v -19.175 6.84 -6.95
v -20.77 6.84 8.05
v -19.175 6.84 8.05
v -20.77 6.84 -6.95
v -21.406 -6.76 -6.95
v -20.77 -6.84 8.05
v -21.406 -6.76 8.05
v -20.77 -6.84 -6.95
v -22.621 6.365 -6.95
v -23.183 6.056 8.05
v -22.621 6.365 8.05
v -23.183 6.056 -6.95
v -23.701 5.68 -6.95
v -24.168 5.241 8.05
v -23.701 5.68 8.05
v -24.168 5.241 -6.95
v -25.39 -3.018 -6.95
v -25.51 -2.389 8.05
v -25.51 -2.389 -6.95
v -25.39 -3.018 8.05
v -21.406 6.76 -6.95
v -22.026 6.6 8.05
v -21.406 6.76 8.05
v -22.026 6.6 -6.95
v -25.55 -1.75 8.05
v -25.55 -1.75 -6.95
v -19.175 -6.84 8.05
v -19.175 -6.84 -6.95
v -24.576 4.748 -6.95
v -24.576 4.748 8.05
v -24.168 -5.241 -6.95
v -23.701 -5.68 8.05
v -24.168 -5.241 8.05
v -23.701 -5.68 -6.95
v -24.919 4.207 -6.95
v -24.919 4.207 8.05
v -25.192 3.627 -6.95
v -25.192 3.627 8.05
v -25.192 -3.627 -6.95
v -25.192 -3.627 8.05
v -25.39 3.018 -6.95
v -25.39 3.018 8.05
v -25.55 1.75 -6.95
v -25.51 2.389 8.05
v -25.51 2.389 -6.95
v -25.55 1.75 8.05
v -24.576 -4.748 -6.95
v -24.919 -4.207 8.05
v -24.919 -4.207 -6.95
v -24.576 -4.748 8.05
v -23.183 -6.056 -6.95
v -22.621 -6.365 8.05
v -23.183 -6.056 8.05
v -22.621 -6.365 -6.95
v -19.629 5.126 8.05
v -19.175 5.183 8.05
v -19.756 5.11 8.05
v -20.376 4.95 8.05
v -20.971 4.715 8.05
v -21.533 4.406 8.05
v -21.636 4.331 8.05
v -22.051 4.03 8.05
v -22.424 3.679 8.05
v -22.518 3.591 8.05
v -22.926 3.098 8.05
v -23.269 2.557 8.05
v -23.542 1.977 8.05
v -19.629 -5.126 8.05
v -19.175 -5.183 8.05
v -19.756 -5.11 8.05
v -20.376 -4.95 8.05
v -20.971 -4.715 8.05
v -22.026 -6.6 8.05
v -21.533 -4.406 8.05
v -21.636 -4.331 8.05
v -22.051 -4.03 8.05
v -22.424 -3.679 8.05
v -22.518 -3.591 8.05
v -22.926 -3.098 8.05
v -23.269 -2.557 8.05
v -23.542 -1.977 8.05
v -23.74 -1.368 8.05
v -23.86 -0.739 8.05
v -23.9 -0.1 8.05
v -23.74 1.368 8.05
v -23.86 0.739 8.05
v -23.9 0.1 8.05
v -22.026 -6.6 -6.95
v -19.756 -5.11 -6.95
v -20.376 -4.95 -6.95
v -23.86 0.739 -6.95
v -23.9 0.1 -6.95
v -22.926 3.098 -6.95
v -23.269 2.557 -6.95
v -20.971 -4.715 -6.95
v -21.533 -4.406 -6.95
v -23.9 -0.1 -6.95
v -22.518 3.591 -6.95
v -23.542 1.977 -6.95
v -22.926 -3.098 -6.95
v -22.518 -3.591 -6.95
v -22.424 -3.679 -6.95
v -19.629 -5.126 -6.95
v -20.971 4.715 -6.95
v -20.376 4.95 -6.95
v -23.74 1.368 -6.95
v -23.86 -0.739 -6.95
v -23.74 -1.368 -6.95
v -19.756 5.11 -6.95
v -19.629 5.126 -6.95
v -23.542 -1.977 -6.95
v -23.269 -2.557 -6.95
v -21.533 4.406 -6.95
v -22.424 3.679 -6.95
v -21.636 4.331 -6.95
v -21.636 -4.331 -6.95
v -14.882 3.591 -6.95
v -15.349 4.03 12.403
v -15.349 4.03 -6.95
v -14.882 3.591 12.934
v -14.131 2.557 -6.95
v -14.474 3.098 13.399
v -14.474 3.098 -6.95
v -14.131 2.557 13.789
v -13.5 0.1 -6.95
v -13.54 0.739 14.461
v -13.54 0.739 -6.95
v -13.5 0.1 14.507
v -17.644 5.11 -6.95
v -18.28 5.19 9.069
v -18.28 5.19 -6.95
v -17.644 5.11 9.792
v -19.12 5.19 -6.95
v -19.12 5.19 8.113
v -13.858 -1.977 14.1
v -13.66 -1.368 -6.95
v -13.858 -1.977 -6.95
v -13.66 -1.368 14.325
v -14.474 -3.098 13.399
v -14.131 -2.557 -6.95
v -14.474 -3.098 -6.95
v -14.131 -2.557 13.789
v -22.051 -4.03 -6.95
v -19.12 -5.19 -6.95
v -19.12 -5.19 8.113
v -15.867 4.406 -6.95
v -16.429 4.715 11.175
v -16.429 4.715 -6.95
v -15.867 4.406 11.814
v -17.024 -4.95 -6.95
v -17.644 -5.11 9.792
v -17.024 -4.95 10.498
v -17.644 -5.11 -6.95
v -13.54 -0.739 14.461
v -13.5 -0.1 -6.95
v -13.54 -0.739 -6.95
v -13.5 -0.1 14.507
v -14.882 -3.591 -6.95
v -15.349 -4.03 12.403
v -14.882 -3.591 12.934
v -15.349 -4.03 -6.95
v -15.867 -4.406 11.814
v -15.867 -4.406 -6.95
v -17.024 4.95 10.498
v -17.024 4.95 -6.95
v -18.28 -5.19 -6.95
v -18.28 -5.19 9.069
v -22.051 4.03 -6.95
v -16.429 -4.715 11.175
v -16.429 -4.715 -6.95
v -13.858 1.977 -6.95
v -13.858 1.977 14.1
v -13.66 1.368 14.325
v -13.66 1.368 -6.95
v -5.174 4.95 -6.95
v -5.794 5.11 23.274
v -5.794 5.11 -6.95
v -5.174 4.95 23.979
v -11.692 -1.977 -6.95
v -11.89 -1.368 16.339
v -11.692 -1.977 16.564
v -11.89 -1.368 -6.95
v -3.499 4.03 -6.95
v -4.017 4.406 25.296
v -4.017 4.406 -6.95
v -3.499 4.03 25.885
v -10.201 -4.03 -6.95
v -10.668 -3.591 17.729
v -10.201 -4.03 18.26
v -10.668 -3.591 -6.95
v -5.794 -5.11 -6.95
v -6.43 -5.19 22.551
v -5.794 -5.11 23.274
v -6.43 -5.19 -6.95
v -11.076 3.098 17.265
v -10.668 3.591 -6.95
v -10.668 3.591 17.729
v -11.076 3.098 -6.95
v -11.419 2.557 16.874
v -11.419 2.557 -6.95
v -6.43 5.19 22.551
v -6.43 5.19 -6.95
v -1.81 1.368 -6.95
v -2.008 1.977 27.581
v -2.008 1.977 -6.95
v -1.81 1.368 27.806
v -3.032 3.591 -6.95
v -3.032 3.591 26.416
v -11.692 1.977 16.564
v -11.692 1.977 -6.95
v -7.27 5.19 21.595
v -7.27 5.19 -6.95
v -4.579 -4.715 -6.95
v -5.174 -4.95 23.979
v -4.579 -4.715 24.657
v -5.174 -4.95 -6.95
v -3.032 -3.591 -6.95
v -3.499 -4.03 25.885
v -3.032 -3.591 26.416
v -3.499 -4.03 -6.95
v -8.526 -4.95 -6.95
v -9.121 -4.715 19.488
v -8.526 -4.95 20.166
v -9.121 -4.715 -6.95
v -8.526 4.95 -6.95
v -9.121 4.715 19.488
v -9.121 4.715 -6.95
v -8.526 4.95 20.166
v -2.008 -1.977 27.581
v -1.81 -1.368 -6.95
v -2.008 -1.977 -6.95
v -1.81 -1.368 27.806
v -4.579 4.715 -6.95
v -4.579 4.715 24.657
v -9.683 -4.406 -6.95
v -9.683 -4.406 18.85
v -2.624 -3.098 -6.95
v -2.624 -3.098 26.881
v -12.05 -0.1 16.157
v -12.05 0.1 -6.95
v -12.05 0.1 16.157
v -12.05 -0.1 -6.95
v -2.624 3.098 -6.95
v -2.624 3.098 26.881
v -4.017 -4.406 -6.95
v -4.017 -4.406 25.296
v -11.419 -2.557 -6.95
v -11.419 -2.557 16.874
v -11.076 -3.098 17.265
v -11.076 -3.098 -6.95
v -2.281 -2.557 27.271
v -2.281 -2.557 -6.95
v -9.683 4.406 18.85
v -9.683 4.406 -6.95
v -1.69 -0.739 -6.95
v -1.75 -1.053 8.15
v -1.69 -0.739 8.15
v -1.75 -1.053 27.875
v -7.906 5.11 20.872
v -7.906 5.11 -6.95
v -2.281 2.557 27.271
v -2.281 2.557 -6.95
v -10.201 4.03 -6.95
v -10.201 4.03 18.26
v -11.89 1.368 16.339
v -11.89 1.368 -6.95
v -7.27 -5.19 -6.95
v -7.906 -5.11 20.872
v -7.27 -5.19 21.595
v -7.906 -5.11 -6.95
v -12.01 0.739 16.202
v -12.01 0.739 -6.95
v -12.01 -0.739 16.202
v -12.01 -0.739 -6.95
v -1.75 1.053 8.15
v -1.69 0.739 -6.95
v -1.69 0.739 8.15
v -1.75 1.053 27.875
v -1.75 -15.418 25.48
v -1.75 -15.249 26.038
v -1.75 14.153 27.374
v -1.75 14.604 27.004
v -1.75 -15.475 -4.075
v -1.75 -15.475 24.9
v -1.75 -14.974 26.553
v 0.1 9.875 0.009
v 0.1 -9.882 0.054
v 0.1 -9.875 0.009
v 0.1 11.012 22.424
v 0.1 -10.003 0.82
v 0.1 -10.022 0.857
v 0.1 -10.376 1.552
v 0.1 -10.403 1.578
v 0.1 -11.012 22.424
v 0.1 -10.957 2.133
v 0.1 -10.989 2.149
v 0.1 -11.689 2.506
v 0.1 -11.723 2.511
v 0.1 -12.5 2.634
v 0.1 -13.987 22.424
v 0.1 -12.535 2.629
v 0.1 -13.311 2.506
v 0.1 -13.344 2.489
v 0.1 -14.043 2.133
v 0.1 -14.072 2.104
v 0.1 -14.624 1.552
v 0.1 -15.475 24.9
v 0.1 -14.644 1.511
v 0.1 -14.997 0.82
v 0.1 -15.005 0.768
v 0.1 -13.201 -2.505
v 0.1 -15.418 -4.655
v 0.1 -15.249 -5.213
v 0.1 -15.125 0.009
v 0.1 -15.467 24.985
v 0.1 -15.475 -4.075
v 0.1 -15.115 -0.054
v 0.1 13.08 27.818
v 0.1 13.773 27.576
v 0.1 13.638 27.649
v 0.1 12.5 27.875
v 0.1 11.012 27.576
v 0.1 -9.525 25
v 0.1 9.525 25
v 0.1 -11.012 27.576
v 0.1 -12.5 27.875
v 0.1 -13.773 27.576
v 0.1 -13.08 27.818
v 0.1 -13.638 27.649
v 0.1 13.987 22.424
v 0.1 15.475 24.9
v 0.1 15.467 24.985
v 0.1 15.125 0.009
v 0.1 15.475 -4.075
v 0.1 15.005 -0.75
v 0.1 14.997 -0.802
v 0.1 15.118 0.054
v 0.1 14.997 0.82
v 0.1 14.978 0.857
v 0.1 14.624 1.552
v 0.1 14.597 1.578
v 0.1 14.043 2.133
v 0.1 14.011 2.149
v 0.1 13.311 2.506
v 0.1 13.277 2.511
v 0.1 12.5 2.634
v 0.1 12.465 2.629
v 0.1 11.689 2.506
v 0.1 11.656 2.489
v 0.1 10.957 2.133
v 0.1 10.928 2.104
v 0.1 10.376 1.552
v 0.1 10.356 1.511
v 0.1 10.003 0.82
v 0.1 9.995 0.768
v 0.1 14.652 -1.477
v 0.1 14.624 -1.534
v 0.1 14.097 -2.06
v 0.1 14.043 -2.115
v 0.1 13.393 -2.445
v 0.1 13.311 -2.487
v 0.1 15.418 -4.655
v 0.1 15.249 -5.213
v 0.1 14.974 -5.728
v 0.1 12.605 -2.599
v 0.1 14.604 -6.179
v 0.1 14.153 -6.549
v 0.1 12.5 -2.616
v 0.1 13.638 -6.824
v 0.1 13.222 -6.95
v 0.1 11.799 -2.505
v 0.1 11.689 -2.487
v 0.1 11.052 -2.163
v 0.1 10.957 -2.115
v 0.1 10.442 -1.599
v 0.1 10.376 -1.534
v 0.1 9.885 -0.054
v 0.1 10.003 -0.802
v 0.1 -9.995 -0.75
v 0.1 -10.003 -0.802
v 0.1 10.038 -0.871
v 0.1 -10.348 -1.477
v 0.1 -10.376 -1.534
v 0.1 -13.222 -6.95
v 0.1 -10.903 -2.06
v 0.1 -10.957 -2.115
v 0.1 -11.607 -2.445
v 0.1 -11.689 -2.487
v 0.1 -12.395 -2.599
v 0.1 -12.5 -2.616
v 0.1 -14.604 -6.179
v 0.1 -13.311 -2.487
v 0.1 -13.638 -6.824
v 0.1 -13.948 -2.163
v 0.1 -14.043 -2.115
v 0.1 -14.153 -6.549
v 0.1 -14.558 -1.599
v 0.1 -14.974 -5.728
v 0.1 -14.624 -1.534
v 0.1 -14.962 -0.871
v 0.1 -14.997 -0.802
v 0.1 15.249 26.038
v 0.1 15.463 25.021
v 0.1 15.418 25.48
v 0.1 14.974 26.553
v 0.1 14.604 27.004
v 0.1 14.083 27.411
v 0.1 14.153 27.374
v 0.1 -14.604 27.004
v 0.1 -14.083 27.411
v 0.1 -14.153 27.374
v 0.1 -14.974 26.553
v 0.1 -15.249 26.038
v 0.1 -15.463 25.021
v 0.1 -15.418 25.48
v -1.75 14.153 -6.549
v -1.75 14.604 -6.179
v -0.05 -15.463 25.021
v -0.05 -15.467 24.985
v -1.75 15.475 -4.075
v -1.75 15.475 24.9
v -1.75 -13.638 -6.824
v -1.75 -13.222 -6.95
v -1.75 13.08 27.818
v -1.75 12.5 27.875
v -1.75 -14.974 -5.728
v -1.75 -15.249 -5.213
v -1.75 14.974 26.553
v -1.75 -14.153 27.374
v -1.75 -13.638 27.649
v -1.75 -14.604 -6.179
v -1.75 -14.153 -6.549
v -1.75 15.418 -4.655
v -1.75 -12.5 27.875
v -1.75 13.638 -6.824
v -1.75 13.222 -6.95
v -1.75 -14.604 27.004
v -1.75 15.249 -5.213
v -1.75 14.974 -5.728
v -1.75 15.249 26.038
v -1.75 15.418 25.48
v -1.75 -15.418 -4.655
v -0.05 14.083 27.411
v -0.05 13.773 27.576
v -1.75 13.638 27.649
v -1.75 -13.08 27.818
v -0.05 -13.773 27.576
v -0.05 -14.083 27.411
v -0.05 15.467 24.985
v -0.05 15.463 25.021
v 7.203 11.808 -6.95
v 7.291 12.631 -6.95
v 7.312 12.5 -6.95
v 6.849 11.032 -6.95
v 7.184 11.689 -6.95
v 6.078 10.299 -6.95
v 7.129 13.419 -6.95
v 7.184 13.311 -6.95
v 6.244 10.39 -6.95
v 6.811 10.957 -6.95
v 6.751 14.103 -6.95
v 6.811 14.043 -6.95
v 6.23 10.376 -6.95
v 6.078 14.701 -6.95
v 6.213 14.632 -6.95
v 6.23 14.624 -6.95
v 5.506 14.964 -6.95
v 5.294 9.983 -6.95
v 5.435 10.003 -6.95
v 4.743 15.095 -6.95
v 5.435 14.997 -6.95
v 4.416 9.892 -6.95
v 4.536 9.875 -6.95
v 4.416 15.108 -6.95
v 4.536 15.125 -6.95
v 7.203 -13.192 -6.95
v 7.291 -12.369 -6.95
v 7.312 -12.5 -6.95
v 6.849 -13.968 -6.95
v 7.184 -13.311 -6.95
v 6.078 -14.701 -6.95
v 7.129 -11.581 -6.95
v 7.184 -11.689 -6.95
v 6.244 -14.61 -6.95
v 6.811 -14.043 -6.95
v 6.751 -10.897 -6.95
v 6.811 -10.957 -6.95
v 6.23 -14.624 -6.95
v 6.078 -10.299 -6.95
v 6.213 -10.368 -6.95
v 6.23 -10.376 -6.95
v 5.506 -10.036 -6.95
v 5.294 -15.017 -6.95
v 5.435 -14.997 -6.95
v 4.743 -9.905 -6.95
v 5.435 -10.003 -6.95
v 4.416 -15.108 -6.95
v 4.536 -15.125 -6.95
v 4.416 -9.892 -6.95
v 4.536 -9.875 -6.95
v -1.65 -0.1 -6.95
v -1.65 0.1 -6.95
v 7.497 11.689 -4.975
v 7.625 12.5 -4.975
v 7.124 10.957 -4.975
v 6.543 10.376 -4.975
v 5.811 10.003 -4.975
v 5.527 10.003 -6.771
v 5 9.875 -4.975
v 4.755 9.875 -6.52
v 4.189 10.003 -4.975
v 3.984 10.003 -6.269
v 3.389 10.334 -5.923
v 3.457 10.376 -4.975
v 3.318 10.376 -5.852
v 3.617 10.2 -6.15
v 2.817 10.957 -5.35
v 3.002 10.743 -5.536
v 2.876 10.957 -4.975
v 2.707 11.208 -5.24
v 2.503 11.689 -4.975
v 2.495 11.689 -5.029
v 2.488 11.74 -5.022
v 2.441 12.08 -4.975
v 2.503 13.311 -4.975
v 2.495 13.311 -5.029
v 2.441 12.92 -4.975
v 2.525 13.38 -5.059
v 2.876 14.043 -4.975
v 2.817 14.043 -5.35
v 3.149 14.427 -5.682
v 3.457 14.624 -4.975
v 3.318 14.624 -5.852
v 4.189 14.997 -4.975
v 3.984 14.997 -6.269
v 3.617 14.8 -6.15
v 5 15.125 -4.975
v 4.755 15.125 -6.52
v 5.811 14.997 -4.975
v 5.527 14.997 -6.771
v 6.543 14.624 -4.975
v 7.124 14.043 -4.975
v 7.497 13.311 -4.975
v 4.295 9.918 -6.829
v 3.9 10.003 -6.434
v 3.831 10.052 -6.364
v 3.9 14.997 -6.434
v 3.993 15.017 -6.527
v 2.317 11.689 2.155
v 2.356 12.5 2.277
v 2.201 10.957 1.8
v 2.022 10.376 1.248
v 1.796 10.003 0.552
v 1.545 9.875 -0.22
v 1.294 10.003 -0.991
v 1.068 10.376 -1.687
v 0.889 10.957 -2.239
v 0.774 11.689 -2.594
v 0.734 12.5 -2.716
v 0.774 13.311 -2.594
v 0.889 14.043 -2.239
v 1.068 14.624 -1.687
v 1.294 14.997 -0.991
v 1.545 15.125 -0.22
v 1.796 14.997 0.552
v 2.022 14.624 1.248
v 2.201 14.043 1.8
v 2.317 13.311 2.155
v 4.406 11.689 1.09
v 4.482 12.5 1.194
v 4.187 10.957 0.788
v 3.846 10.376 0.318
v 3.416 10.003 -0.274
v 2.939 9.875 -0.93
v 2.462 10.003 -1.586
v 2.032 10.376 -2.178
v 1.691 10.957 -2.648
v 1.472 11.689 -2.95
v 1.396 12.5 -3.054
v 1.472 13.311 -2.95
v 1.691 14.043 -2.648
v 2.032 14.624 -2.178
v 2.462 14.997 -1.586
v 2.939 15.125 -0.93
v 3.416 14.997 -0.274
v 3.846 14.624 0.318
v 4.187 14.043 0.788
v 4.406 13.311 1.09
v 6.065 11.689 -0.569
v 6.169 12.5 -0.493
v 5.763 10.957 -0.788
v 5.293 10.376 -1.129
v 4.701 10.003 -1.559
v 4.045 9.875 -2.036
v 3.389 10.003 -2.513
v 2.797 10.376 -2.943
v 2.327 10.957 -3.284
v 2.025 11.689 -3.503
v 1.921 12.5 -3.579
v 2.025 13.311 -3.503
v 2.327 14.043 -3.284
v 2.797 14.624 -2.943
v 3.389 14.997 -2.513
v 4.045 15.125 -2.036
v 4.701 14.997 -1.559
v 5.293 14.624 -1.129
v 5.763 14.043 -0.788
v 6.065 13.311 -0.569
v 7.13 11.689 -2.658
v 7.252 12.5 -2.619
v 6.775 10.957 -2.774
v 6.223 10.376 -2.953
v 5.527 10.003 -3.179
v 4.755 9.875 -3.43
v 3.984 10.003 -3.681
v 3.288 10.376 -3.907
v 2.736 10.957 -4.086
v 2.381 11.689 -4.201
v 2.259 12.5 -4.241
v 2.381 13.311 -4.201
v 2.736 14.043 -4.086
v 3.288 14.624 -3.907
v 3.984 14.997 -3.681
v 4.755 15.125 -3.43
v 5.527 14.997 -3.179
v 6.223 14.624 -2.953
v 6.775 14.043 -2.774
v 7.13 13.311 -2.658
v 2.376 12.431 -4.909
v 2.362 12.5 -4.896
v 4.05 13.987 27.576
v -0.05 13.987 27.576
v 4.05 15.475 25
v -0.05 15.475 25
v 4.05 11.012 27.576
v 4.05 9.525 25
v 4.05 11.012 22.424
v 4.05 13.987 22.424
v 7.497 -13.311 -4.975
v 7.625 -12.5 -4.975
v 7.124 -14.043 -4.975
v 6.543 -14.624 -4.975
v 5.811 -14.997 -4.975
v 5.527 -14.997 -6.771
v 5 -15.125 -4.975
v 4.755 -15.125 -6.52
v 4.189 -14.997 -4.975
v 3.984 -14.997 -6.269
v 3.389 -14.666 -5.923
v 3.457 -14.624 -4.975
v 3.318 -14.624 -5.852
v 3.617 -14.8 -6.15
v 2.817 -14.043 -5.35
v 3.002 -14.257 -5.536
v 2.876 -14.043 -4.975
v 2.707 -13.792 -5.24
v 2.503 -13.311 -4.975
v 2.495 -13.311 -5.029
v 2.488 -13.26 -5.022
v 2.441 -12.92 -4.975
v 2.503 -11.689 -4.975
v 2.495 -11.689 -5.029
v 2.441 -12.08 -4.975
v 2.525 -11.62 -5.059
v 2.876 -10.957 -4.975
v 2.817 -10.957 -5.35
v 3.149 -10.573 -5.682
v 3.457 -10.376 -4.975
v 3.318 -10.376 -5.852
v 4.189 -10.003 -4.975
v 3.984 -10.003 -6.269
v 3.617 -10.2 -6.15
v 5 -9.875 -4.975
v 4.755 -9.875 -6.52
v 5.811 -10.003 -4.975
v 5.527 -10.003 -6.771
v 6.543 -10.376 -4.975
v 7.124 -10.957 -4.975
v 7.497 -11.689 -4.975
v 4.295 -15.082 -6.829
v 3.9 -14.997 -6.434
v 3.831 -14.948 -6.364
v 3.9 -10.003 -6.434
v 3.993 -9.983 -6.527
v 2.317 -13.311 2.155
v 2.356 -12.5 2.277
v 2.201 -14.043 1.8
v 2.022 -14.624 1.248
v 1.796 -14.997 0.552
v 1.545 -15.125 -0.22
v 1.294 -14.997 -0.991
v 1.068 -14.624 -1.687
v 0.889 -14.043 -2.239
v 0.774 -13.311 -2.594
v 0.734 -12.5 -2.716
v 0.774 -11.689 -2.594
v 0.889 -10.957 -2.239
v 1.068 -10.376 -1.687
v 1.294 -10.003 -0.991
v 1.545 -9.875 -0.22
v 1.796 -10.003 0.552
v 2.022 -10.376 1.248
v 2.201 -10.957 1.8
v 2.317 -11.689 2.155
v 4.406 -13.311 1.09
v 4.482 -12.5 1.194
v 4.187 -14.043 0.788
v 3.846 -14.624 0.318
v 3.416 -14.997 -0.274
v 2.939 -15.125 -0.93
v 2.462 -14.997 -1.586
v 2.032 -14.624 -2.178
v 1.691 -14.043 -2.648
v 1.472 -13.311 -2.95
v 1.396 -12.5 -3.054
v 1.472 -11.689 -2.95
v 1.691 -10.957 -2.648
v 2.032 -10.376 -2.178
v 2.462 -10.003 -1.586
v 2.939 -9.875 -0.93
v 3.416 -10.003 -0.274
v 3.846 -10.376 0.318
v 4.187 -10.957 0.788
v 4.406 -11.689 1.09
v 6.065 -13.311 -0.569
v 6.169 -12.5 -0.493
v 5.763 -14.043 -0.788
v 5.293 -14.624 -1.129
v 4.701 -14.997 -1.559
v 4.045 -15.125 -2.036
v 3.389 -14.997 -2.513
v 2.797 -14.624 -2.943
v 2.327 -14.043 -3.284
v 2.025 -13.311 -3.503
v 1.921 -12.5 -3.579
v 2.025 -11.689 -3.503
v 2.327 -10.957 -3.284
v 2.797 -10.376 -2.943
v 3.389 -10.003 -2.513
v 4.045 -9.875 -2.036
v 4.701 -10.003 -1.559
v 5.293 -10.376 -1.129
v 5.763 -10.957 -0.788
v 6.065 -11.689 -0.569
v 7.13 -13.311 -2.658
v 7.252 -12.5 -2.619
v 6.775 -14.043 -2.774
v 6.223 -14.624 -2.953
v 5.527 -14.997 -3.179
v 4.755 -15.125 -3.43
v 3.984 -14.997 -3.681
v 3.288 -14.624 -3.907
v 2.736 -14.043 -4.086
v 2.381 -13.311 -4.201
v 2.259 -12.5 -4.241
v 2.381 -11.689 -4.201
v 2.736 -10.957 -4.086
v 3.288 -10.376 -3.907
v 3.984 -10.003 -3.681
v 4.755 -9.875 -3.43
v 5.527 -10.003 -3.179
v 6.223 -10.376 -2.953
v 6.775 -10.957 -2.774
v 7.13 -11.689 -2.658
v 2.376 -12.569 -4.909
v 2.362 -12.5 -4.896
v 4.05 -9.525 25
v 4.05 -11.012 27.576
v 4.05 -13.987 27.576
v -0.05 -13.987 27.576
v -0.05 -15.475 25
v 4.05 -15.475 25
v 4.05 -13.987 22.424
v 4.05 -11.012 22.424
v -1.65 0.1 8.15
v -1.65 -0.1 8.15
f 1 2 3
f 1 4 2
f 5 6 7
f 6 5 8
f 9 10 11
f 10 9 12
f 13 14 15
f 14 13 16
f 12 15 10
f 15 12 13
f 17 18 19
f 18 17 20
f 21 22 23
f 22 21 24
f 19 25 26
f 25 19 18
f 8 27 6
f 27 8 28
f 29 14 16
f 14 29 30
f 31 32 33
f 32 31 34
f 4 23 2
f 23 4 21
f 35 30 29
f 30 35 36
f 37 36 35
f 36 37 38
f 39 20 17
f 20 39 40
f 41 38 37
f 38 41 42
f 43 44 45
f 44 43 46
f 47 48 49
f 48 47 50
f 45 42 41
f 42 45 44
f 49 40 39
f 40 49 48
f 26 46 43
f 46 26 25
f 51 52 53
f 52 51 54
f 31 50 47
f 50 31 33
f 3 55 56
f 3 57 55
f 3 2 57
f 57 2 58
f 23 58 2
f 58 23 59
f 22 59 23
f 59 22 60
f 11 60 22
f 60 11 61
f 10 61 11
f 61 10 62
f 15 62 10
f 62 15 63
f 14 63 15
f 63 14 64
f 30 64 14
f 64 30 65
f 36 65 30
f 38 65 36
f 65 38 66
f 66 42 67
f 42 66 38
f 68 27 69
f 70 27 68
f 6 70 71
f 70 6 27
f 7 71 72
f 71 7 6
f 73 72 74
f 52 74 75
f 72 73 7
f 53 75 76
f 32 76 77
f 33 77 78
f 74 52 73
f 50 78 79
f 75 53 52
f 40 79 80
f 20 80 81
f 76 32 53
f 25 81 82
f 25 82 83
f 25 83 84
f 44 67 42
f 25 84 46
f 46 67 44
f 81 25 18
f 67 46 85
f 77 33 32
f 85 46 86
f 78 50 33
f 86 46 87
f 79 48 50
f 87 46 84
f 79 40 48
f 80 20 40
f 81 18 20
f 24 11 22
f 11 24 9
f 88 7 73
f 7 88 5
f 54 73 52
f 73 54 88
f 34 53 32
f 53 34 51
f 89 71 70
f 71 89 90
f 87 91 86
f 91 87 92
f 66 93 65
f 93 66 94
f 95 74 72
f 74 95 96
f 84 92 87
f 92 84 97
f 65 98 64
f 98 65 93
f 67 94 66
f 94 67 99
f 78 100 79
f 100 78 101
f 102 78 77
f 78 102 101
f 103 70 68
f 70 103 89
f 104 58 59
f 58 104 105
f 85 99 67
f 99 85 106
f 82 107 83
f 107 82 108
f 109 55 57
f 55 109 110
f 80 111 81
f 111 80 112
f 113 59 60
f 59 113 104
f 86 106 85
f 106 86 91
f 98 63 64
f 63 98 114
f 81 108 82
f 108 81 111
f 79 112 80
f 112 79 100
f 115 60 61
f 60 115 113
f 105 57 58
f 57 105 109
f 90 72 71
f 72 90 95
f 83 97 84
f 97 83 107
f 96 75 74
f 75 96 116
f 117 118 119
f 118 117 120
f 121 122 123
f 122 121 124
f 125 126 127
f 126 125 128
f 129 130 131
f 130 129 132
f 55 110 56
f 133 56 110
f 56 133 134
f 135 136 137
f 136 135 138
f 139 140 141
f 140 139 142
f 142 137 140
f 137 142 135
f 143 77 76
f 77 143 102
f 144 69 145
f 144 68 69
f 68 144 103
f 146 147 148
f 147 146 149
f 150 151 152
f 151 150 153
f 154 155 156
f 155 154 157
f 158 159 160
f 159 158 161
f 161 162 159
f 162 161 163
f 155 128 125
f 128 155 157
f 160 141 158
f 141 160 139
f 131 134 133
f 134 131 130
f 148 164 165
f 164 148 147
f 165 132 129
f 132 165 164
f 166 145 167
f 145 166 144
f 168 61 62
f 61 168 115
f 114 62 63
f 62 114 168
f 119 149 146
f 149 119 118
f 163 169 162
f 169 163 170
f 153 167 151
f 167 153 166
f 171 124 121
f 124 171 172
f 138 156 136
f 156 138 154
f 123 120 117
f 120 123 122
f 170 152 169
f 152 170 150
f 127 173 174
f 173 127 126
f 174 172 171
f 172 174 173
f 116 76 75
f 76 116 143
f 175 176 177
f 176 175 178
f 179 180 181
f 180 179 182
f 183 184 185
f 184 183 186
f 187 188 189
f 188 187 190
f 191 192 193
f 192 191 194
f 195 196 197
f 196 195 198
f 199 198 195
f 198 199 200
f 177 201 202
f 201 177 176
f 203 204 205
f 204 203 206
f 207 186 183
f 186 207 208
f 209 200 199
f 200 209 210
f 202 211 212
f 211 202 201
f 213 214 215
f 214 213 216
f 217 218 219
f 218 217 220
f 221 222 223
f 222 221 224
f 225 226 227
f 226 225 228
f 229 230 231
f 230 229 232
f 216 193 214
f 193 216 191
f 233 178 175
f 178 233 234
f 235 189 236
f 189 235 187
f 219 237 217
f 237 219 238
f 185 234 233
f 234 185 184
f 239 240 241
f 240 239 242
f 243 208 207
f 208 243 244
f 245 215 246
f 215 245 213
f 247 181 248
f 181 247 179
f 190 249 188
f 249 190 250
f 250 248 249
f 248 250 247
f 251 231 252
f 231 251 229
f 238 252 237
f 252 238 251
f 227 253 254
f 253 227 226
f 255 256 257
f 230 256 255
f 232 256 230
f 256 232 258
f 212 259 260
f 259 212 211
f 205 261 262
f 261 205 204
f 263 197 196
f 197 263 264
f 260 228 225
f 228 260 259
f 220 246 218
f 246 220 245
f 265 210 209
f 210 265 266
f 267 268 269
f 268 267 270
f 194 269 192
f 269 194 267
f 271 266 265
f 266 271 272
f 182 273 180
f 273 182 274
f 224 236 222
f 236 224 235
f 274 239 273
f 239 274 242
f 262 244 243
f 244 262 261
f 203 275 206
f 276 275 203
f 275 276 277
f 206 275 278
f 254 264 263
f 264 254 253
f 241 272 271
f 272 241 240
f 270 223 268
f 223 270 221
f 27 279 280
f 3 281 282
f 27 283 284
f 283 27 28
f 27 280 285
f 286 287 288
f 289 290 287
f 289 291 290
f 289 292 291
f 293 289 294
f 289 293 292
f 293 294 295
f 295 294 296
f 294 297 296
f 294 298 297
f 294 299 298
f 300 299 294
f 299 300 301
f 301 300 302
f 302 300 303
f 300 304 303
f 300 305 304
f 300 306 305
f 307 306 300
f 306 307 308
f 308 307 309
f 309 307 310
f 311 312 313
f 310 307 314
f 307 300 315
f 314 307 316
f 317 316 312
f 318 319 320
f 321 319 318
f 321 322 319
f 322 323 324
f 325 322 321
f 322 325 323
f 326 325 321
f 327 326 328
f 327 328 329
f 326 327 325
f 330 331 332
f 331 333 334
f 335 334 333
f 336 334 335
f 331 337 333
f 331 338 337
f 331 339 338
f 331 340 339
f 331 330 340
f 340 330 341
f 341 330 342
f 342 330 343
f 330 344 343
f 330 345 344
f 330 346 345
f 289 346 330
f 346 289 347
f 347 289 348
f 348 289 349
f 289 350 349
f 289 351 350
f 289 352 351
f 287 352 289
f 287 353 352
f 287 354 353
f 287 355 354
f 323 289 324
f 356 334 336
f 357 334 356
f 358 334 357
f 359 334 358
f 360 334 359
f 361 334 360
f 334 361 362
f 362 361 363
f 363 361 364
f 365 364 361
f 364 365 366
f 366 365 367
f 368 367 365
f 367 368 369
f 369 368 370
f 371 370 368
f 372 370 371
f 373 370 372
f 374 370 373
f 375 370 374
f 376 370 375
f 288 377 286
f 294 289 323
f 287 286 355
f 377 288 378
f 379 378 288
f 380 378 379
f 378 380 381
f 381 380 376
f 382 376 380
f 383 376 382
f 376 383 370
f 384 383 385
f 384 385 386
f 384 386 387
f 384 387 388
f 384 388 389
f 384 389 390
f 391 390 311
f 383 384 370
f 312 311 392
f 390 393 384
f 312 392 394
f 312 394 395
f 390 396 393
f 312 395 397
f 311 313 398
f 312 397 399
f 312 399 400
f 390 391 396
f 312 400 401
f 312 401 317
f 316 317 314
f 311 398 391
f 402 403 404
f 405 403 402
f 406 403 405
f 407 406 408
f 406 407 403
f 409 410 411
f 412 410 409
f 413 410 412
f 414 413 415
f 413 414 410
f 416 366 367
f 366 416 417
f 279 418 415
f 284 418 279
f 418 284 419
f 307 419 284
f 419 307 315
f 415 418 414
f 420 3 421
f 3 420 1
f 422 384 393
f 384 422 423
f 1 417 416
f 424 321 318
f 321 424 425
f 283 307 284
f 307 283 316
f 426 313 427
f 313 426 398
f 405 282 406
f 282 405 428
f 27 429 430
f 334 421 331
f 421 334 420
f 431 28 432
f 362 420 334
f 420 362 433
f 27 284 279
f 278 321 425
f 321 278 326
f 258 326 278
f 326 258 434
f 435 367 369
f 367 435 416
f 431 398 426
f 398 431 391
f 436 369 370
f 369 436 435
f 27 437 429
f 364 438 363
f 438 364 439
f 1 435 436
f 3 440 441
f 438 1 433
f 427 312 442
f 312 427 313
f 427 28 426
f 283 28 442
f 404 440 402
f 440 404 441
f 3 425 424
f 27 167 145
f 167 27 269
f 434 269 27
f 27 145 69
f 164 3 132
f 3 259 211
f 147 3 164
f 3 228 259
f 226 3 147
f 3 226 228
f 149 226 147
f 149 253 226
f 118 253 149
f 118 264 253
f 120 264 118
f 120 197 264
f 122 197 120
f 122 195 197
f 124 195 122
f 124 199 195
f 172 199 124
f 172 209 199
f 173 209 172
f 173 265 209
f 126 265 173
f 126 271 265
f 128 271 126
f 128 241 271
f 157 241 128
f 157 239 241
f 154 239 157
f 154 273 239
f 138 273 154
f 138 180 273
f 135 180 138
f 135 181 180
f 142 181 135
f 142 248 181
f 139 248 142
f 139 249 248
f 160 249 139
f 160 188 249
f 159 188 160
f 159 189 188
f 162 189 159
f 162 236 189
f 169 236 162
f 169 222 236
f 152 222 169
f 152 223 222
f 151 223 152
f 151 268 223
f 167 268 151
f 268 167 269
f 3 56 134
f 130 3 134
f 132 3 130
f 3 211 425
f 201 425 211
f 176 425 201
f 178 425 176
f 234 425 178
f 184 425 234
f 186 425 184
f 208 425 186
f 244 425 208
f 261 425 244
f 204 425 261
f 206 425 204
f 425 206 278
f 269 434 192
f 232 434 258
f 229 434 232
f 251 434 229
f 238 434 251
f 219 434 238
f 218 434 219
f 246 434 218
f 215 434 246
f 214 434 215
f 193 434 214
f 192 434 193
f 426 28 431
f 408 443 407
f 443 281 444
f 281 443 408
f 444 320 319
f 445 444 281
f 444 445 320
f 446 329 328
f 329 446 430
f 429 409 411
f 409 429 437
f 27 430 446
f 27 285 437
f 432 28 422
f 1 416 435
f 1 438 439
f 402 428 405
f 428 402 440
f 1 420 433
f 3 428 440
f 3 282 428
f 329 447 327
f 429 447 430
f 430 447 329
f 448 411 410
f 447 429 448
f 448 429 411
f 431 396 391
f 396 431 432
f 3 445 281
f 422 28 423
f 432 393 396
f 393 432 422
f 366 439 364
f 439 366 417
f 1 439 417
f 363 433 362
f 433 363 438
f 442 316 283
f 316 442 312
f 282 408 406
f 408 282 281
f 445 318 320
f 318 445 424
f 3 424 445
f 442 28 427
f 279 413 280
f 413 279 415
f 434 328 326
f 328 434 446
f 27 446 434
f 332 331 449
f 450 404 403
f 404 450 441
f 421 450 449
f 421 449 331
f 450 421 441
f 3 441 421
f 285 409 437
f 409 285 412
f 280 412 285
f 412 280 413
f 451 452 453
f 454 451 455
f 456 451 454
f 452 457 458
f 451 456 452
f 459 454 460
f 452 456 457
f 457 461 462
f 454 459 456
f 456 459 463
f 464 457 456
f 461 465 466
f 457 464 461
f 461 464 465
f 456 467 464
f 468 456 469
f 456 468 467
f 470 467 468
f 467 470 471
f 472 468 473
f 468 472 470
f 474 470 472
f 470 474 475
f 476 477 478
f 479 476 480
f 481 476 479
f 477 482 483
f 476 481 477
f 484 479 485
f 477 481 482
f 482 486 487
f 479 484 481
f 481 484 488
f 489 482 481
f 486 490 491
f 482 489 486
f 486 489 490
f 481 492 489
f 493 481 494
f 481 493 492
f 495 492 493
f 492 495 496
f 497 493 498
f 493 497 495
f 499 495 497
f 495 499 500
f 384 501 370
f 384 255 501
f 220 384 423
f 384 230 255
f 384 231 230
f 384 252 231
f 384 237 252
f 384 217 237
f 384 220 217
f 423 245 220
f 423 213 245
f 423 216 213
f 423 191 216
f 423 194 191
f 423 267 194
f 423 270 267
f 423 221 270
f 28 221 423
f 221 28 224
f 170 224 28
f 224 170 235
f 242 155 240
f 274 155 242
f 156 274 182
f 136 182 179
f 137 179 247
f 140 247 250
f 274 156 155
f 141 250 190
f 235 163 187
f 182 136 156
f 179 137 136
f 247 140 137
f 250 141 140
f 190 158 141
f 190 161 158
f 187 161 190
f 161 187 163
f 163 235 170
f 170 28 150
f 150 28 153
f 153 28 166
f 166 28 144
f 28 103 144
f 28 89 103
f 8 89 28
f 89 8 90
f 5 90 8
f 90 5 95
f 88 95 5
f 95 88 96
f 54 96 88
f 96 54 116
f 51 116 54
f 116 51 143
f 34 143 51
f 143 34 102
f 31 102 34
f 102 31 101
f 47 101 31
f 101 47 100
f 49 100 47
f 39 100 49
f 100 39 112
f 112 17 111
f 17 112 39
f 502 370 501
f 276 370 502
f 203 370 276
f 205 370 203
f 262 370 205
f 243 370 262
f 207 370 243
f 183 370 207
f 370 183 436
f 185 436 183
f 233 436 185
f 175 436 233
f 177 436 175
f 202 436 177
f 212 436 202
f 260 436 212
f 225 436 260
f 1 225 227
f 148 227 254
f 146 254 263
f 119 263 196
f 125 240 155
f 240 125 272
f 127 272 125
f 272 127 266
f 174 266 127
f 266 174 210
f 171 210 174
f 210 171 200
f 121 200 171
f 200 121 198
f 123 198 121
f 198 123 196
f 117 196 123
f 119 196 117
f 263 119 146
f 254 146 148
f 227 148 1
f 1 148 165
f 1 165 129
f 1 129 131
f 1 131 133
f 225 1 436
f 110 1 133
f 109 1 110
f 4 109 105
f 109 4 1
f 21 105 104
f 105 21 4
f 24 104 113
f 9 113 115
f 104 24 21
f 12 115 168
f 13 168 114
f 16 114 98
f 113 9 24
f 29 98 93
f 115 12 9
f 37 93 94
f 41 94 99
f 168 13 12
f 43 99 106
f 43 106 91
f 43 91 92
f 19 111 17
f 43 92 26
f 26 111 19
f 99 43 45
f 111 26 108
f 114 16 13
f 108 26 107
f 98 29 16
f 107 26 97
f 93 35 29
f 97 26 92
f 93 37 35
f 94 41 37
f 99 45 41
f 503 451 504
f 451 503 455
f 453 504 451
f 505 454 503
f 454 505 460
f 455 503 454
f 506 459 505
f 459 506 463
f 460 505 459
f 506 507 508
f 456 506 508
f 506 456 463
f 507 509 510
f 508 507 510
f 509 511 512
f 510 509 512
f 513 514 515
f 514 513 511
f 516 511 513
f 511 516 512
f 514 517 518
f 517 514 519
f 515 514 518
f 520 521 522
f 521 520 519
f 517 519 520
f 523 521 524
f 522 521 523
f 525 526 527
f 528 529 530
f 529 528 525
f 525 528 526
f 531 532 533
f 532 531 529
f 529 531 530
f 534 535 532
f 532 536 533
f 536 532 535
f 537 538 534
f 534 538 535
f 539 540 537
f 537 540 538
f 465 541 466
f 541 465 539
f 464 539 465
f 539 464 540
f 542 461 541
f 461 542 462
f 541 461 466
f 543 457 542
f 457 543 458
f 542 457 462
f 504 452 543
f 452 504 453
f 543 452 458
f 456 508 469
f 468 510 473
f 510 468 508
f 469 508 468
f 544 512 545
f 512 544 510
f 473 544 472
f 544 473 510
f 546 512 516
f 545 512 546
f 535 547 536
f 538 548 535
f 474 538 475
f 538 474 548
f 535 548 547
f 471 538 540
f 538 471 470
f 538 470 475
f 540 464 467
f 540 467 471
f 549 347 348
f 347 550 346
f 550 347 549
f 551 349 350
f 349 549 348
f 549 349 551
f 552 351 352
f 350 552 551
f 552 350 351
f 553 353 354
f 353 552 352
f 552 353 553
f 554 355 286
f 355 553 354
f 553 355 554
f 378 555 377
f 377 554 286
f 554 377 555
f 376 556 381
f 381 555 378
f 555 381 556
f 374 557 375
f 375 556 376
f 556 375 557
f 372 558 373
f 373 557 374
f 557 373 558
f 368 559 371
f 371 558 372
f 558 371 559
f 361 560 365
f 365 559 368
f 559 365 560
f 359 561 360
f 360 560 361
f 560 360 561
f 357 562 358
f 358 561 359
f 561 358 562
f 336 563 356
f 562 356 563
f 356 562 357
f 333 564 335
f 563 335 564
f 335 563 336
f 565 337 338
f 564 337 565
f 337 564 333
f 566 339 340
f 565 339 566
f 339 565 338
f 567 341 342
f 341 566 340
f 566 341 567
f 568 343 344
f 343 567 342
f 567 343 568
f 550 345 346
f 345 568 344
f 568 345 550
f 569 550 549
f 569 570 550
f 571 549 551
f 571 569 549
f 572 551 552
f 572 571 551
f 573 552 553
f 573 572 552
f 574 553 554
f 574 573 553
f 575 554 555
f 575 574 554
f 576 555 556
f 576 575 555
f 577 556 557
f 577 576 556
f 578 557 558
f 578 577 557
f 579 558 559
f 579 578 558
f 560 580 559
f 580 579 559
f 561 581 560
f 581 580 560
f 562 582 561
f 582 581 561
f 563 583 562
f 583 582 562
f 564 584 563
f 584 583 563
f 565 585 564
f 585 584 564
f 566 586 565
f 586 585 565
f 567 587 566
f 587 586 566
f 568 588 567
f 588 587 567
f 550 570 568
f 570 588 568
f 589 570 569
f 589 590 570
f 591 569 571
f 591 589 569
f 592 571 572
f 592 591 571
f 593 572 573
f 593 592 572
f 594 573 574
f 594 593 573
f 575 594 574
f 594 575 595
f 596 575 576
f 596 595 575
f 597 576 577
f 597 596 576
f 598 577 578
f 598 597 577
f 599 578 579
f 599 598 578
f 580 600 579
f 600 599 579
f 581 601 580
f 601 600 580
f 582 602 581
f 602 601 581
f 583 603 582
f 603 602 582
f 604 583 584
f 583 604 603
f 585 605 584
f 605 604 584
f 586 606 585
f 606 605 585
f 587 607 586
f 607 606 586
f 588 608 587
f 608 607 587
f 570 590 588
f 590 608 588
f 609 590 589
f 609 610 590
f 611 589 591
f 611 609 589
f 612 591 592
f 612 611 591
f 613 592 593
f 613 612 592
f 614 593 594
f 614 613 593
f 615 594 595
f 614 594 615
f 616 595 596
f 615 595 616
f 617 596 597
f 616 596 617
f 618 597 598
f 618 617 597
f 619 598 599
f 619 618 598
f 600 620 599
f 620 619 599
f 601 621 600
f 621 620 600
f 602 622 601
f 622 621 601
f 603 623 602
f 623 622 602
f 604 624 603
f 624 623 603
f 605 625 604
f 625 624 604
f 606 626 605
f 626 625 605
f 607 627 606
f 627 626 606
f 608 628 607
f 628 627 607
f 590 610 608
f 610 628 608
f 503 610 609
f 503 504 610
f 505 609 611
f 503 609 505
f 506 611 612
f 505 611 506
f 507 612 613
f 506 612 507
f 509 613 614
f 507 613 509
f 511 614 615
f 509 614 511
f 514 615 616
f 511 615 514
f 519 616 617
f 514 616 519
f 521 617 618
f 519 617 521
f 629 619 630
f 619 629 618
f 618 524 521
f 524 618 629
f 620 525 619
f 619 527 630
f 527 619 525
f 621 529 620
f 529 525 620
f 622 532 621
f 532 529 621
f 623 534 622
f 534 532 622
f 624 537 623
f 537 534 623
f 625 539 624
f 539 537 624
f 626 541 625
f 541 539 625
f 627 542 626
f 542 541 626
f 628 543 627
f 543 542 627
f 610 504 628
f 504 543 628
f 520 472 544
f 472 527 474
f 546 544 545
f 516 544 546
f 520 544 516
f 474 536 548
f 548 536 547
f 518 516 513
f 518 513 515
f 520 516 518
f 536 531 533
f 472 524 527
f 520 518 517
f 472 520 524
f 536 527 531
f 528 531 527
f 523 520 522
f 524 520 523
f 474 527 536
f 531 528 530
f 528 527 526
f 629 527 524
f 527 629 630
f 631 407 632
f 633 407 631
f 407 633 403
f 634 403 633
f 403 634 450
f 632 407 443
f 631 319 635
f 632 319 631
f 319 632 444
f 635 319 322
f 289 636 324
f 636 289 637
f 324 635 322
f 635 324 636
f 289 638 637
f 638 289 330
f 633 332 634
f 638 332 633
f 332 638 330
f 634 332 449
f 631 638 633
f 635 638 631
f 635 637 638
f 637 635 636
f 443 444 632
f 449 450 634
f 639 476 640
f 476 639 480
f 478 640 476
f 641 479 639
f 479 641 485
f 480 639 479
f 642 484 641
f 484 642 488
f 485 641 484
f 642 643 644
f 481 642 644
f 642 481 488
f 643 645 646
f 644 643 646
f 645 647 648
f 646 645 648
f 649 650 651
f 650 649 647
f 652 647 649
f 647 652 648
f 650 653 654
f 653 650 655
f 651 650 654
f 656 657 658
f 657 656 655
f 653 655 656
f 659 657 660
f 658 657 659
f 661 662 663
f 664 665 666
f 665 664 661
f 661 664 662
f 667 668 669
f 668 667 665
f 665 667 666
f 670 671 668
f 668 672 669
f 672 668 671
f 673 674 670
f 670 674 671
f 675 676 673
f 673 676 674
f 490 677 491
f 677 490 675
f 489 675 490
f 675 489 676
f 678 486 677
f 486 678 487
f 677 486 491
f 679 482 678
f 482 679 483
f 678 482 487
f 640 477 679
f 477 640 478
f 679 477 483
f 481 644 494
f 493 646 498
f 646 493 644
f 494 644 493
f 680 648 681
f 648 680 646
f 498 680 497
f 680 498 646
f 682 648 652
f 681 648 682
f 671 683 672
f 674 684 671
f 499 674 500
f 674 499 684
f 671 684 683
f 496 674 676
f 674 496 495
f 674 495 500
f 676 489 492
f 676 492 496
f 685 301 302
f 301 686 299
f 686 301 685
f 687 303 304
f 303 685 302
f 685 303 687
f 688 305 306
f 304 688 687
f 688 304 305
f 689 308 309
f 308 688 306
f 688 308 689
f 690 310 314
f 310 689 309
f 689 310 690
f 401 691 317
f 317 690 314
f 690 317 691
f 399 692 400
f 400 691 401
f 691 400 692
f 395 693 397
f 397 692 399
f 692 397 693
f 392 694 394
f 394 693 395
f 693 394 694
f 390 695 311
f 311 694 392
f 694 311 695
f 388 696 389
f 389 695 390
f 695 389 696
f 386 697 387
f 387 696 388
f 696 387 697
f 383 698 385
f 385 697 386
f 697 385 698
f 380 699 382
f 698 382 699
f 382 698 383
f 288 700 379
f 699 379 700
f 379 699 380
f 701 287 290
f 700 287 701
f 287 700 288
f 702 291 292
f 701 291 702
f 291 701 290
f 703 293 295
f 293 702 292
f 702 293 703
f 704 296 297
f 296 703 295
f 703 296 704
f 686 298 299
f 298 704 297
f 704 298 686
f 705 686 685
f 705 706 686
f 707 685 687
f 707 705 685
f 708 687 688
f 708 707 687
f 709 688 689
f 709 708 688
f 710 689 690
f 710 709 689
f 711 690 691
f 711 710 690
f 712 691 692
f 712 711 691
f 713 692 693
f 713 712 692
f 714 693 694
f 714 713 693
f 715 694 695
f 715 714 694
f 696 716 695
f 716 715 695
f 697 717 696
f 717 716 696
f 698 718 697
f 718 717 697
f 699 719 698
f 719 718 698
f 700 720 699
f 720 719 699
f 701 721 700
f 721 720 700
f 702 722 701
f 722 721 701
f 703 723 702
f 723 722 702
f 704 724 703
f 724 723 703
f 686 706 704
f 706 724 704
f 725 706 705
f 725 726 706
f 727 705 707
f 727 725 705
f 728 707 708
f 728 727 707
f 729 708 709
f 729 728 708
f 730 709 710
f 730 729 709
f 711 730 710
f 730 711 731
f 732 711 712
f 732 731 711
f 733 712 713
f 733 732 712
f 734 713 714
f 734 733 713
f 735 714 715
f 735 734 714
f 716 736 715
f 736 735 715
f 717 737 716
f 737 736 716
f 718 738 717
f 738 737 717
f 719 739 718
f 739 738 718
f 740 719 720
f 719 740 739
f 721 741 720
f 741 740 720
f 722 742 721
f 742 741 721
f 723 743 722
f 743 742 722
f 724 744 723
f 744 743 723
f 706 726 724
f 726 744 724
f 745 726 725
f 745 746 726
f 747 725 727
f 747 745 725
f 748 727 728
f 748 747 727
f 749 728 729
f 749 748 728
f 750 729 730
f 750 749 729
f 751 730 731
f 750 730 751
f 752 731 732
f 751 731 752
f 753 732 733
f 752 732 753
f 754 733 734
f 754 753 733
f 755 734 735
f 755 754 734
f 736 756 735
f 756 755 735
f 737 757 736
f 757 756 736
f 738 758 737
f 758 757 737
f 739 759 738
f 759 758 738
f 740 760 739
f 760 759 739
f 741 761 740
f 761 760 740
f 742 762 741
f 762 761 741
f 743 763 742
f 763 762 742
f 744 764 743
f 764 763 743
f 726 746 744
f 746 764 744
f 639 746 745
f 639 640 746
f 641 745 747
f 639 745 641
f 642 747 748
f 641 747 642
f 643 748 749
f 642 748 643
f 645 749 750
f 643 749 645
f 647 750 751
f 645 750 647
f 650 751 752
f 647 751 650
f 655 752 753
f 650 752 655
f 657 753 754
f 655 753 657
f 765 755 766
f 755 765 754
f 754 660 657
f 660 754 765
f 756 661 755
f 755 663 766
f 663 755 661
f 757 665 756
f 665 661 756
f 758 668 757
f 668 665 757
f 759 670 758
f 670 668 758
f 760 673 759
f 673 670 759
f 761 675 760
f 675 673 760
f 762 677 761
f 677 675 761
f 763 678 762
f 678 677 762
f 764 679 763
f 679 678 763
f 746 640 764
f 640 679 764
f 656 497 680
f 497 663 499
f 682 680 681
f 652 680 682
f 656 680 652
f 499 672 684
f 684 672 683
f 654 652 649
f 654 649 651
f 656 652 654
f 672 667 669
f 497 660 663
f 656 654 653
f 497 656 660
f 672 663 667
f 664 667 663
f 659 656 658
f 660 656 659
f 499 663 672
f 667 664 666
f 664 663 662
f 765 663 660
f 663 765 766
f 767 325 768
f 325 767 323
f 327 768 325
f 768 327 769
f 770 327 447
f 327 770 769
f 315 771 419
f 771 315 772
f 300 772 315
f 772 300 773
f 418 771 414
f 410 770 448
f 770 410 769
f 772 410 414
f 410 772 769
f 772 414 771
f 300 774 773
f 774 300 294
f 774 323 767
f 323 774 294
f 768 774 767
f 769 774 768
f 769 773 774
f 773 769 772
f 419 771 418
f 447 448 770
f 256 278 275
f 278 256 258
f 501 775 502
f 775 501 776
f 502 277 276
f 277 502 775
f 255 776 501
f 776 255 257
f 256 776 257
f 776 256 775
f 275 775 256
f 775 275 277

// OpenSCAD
// PEGSTR - Pegboard Wizard
// Design by Marius Gheorghescu, November 2014
// Update log:
// November 9th 2014
//		- first coomplete version. Angled holders are often odd/incorrect.
// November 15th 2014
//		- minor tweaks to increase rendering speed. added logo. 
// November 28th 2014
//		- bug fixes

// TODO
// closed bottom factor nonbinary
// angle adds offset

// preview[view:north, tilt:bottom diagonal]

/* [Size] [x] */

// adjusts holder_x_size to fit entire width
quantized_x_size = false;

// width of the orifice
holder_x_size = 10; // [1:0.01:200]

// how many times to repeat the holder on X axis
holder_x_count = 1; // [1:20]

// Use values less than 1.0 to make the bottom of the holder narrow
taper_ratio_x = 1.0; // [0:0.001:1]

// adjusts holder_x_spacing to fit entire width
quantized_x_spacing = false;

// spacing greater than wall thickness
holder_x_spacing = 0; // [0:0.01:50]

/* [Size] [y] */

// depth of the orifice
holder_y_size = 10; // [1:0.01:200]

// how many times to repeat the holder on Y axis
holder_y_count = 2; // [1:10]

// Use values less than 1.0 to make the bottom of the holder narrow
taper_ratio_y = 1.0; // [0:0.001:1]

// offset from the peg board, typically 0 unless you have an object that needs clearance
holder_offset = 0.0; // [0:0.01:50]

/* [Size] [z] */

// base is at the bottom-most peg
quantized_z_size = false;

// hight of the holder
holder_z_size = 15; // [1:0.001:120]

/* [Shape] */

// how thick are the walls. Hint: 6*extrusion width produces the best results.
wall_thickness = 1.85; // [0:0.01:20]

// orifice corner radius (roundness). Needs to be less than min(x,y)/2.
corner_radius = 30; // [0:0.01:60]

// what ratio of the holders bottom is reinforced to the plate [0.0-1.0]
strength_factor = 0.66; // [0:0.00001:1]

// for bins: what ratio of wall thickness to use for closing the bottom
closed_bottom = 0.0; // [0:0.01:10]

// what ratio of the holders bottom is closed
closed_bottom_factor = 0.0; // [0:0.01:1]

// lip above closed bottom
closed_bottom_lip = 0.0; // [0:0.01:50]

// what percentage cut in the front (example to slip in a cable or make the tool snap from the side)
holder_cutout_side = 0.0; // [0:0.01:1.5]

// set an angle for the holder to prevent object from sliding or to view it better from the top
holder_angle = 0.0; // [-90:0.01:90]

/* [Flattening] */

// flatten method, for debugging
flatten_method = "difference"; // [difference,intersection,union,none]

// flatten the top, to clips
flatten_top = true;

// flatten top further
flatten_top_additional = 0; // [0:0.001:5]

// flatten the bottom to lower pins
flatten_bottom = false;

// flatten bottom further, default to hex pin base
flatten_bottom_additional = 0.295; // [-1:0.001:10]
// -epsilon + (hole_size - hole_size * sqrt(3) / 2) / 2

/* [Pins] */

// pin diameter
hole_size = 5.95; // [0:0.01:10]

// smaller hook as they are fragile and only used for insertion, not strength
hook_size = 5.25; // [0:0.01:10]

// metric inch
hole_spacing = 25.0; // [0:0.01:100]

// pin length
board_thickness = 0; // [0:0.01:10]

// longer pins for board_thickness 0
pin_extra_len = 4; // [0:0.01:5]

/* [Hidden] */

// what is the $fn parameter for holders
$fn = 32;

epsilon = 0.1;

clip_height = 2 * hole_size + 2;
echo(clip_height=clip_height);
echo();

taper_ratio = (taper_ratio_x + taper_ratio_y) / 2;
echo(taper_ratio=taper_ratio);
echo();

//
// x
//
assert(!(quantized_x_size && quantized_x_spacing), "cannot use quantized x size and even spacing");

echo(holder_x_size=holder_x_size);

requested_total_x = (holder_x_size + wall_thickness) * holder_x_count + wall_thickness + (holder_x_count - 1) * holder_x_spacing;
echo(requested_total_x=requested_total_x);

quantized_total_x = round(requested_total_x / hole_spacing) * hole_spacing + hole_size;
echo(quantized_total_x=quantized_total_x);

quantized_x = (quantized_total_x - wall_thickness) / holder_x_count - wall_thickness;
echo(quantized_x=quantized_x);

quantized_spacing = (quantized_total_x - holder_x_count * (holder_x_size + wall_thickness) - wall_thickness) / (holder_x_count - 1);
echo(quantized_spacing=quantized_spacing);

holder_x_spacing_actual = (quantized_x_spacing && quantized_spacing > 0 && holder_x_count > 0) ? quantized_spacing : holder_x_spacing;
echo(holder_x_spacing_actual=holder_x_spacing_actual);

holder_x_size_actual = quantized_x_size ? quantized_x : holder_x_size;

holder_total_x = wall_thickness + holder_x_count * (wall_thickness + holder_x_size_actual) + holder_x_spacing_actual * (holder_x_count - 1);
echo(holder_total_x=holder_total_x);

echo(holder_x_size_actual=holder_x_size_actual);
echo(bottom_x_size=holder_x_size_actual * taper_ratio_x);
echo();

//
// y
//
echo(holder_y_size=holder_y_size);

holder_total_y = wall_thickness + holder_y_count * (wall_thickness + holder_y_size);
echo(holder_total_y=holder_total_y);

echo(bottom_y_size=holder_y_size * taper_ratio_y);
echo();

//
// z
//
echo(holder_z_size=holder_z_size);

holder_z_size_closed_bottom = holder_z_size + ( (strength_factor > 0 || closed_bottom_factor > 0) ? closed_bottom * wall_thickness : 0);
echo(holder_z_size_closed_bottom=holder_z_size_closed_bottom);

quantized_z = round(holder_z_size_closed_bottom / hole_spacing) * hole_spacing + clip_height / 2 + hole_size / 2 - epsilon;
echo(quantized_z=quantized_z);

min_z = -clip_height / 2;
max_z = min_z + quantized_z;

holder_z_size_actual = quantized_z_size ? quantized_z : holder_z_size_closed_bottom;
echo(holder_z_size_actual=holder_z_size_actual);

echo();

//
// misc
//
holder_roundness = min(corner_radius, holder_x_size_actual / 2, holder_y_size / 2);

// what is the $fn parameter
holder_sides = max(50, min(20, holder_x_size_actual * 2));

module round_rect_ex(x1, y1, x2, y2, z, r1, r2) {
  $fn = holder_sides;
  brim = z / 10;

  //rotate([0,0,(holder_sides==6)?30:((holder_sides==4)?45:0)])
  hull() {
    translate([-x1 / 2 + r1, y1 / 2 - r1, z / 2 - brim / 2])
      cylinder(r=r1, h=brim, center=true);
    translate([x1 / 2 - r1, y1 / 2 - r1, z / 2 - brim / 2])
      cylinder(r=r1, h=brim, center=true);
    translate([-x1 / 2 + r1, -y1 / 2 + r1, z / 2 - brim / 2])
      cylinder(r=r1, h=brim, center=true);
    translate([x1 / 2 - r1, -y1 / 2 + r1, z / 2 - brim / 2])
      cylinder(r=r1, h=brim, center=true);

    translate([-x2 / 2 + r2, y2 / 2 - r2, -z / 2 + brim / 2])
      cylinder(r=r2, h=brim, center=true);
    translate([x2 / 2 - r2, y2 / 2 - r2, -z / 2 + brim / 2])
      cylinder(r=r2, h=brim, center=true);
    translate([-x2 / 2 + r2, -y2 / 2 + r2, -z / 2 + brim / 2])
      cylinder(r=r2, h=brim, center=true);
    translate([x2 / 2 - r2, -y2 / 2 + r2, -z / 2 + brim / 2])
      cylinder(r=r2, h=brim, center=true);
  }
}

module old_pin(clip) {
  rotate([0, 0, 15])
    cylinder(r=hole_size / 2, h=board_thickness * 1.5 + epsilon, center=true, $fn=12);

  if (clip) {
    //
    rotate([0, 0, 90])
      intersection() {
        translate([0, 0, hole_size - epsilon])
          cube([hole_size + 2 * epsilon, clip_height, 2 * hole_size], center=true);

        // [-hole_size/2 - 1.95,0, board_thickness/2]
        translate([0, hole_size / 2 + 2, board_thickness / 2])
          rotate([0, 90, 0])
            rotate_extrude(convexity=5, $fn=20)
              translate([5, 0, 0])
                circle(r=(hole_size * 0.95) / 2);

        translate([0, hole_size / 2 + 2 - 1.6, board_thickness / 2])
          rotate([45, 0, 0])
            translate([0, -0, hole_size * 0.6])
              cube([hole_size + 2 * epsilon, 3 * hole_size, hole_size], center=true);
      }
  }
}

module pin(clip) {
  if (clip) {
    //
    rotate([0, 0, 90])
      intersection() {
        translate([0, 0, hole_size - epsilon])
          cube([hole_size + 2 * epsilon, clip_height, 2 * hole_size], center=true);

        // [-hole_size/2 - 1.95,0, board_thickness/2]
        translate([0, hole_size / 2 + 2, board_thickness / 2])
          rotate([0, 90, 0])
            rotate_extrude(convexity=5, $fn=20)
              translate([5, 0, 0])
                circle(r=(hook_size) / 2);

        translate([0, hole_size / 2 + 2 - 1.6, board_thickness / 2])
          rotate([45, 0, 0])
            translate([0, -0, hole_size * 0.6])
              cube([hole_size + 2 * epsilon, 3 * hole_size, hole_size], center=true);
      }
  } else {
    translate([0, 0, pin_extra_len / 2])
      rotate([0, 0, 30])
        cylinder(r=hole_size / 2, h=board_thickness * 1.5 + epsilon + pin_extra_len, center=true, $fn=6);
  }
}

module pinboard_clips() {
  rotate([0, 90, 0])for (i = [0:round(holder_total_x / hole_spacing)]) {
    for (j = [0:max(strength_factor, round(holder_z_size_actual / hole_spacing))]) {

      translate(
        [
          j * hole_spacing,
          -hole_spacing * (round(holder_total_x / hole_spacing) / 2) + i * hole_spacing,
          0,
        ]
      )
        pin(j == 0);
    }
  }
}

module pinboard(clips) {
  rotate([0, 90, 0])
    translate([-epsilon, 0, -wall_thickness - board_thickness / 2 + epsilon])
      hull() {
        translate(
          [
            -clip_height / 2 + hole_size / 2,
            -hole_spacing * (round(holder_total_x / hole_spacing) / 2),
            0,
          ]
        )
          cylinder(r=hole_size / 2, h=wall_thickness);

        translate(
          [
            -clip_height / 2 + hole_size / 2,
            hole_spacing * (round(holder_total_x / hole_spacing) / 2),
            0,
          ]
        )
          cylinder(r=hole_size / 2, h=wall_thickness);

        translate(
          [
            max(strength_factor, round(holder_z_size_actual / hole_spacing)) * hole_spacing,
            -hole_spacing * (round(holder_total_x / hole_spacing) / 2),
            0,
          ]
        )
          cylinder(r=hole_size / 2, h=wall_thickness);

        translate(
          [
            max(strength_factor, round(holder_z_size_actual / hole_spacing)) * hole_spacing,
            hole_spacing * (round(holder_total_x / hole_spacing) / 2),
            0,
          ]
        )
          cylinder(r=hole_size / 2, h=wall_thickness);
      }
}

module holder(negative) {
  for (x = [1:holder_x_count]) {
    for (y = [1:holder_y_count])
    /*		render(convexity=2)*/ {
      translate(
        [
          -holder_total_y /*- (holder_y_size+wall_thickness)/2*/ + y * (holder_y_size + wall_thickness) + wall_thickness,

          -holder_total_x / 2 + (holder_x_size_actual + wall_thickness) / 2 + (x - 1) * (holder_x_size_actual + wall_thickness) + wall_thickness / 2 + (x - 1) * holder_x_spacing_actual,
          0,
        ]
      ) {
        rotate([0, holder_angle, 0])
          translate(
            [
              -wall_thickness * abs(sin(holder_angle)) - 0 * abs((holder_y_size / 2) * sin(holder_angle)) - holder_offset - (holder_y_size + 2 * wall_thickness) / 2 - board_thickness / 2,
              0,
              -(holder_z_size_actual / 2) * sin(holder_angle) - holder_z_size_actual / 2 + clip_height / 2,
            ]
          )
            difference() {
              if (!negative)

                round_rect_ex(
                  (holder_y_size + 2 * wall_thickness),
                  holder_x_size_actual + 2 * wall_thickness,
                  (holder_y_size + 2 * wall_thickness) * taper_ratio_y,
                  (holder_x_size_actual + 2 * wall_thickness) * taper_ratio_x,
                  holder_z_size_actual,
                  holder_roundness + epsilon,
                  holder_roundness * taper_ratio + epsilon
                );

              translate([0, 0, closed_bottom * wall_thickness])

              if (negative > 1) {
                if (closed_bottom_factor == 0) {
                  round_rect_ex(
                    holder_y_size * taper_ratio_y,
                    holder_x_size_actual * taper_ratio_x,
                    holder_y_size * taper_ratio_y,
                    holder_x_size_actual * taper_ratio_x,
                    3 * max(holder_z_size_actual, hole_spacing),
                    holder_roundness * taper_ratio + epsilon,
                    holder_roundness * taper_ratio + epsilon
                  );
                }
              } else {
                round_rect_ex(
                  holder_y_size,
                  holder_x_size_actual,
                  holder_y_size * taper_ratio_y,
                  holder_x_size_actual * taper_ratio_x,
                  holder_z_size_actual + 2 * epsilon,
                  holder_roundness + epsilon,
                  holder_roundness * taper_ratio + epsilon
                );
              }

              if (!negative)
                if (holder_cutout_side > 0) {

                  if (negative > 1) {
                    hull() {
                      scale([1.0, holder_cutout_side, 1.0])
                        round_rect_ex(
                          holder_y_size * taper_ratio_y,
                          holder_x_size_actual * taper_ratio_x,
                          holder_y_size * taper_ratio_y,
                          holder_x_size_actual * taper_ratio_x,
                          3 * max(holder_z_size_actual, hole_spacing),
                          holder_roundness * taper_ratio + epsilon,
                          holder_roundness * taper_ratio + epsilon
                        );

                      translate([0 - (holder_y_size + 2 * wall_thickness), 0, 0])
                        scale([1.0, holder_cutout_side, 1.0])
                          round_rect_ex(
                            holder_y_size * taper_ratio_y,
                            holder_x_size_actual * taper_ratio_x,
                            holder_y_size * taper_ratio_y,
                            holder_x_size_actual * taper_ratio_x,
                            3 * max(holder_z_size_actual, hole_spacing),
                            holder_roundness * taper_ratio + epsilon,
                            holder_roundness * taper_ratio + epsilon
                          );
                    }
                  } else {

                    // preserve the closed bottom
                    translate([0, 0, closed_bottom_factor > 0 ? wall_thickness * closed_bottom + closed_bottom_lip : 0])

                      hull() {
                        scale([1.0, holder_cutout_side, 1.0])
                          round_rect_ex(
                            holder_y_size,
                            holder_x_size_actual,
                            holder_y_size * taper_ratio_y,
                            holder_x_size_actual * taper_ratio_x,
                            holder_z_size_actual + 2 * epsilon,
                            holder_roundness + epsilon,
                            holder_roundness * taper_ratio + epsilon
                          );

                        translate([0 - (holder_y_size + 2 * wall_thickness), 0, 0])
                          scale([1.0, holder_cutout_side, 1.0])
                            round_rect_ex(
                              holder_y_size,
                              holder_x_size_actual,
                              holder_y_size * taper_ratio_y,
                              holder_x_size_actual * taper_ratio_x,
                              holder_z_size_actual + 2 * epsilon,
                              holder_roundness + epsilon,
                              holder_roundness * taper_ratio + epsilon
                            );
                      }
                  }
                }
            }
      }
      // positioning
    }
    // for y
  }
  // for X
}

module build() {
  difference() {
    union() {

      pinboard();

      difference() {
        hull() {
          pinboard();

          intersection() {
            translate([-holder_offset - (strength_factor - 0.5) * holder_total_y - wall_thickness / 4, 0, 0])
              cube(
                [
                  holder_total_y + 2 * wall_thickness,
                  holder_total_x + wall_thickness,
                  2 * holder_z_size_actual,
                ], center=true
              );

            holder(0);
          }
        }

        if (closed_bottom * wall_thickness < epsilon) {
          holder(2);
        }
      }

      //color([0.2,0.5,0])
      difference() {
        holder(0);
        holder(2);
      }

      color(c="orange")
        pinboard_clips();
    }

    holder(1);
  }
}

module flatten() {
  // confirmed by measuring

  // extra epsilon to depth
  x = holder_total_y + epsilon + clip_height / 2 + wall_thickness + holder_offset + 10;
  dx = -x / 2 + epsilon + clip_height / 2 + wall_thickness + 5;

  // beyond bounds
  y = holder_total_x + hole_spacing;
  dy = 0;

  // clip top and front top are equal; shave off the middle
  z = quantized_z;
  dz = -z / 2 + min_z + flatten_top_additional;

  if (flatten_top) {
    color(c="blue")
      translate(v=[dx, dy, dz])
        cube(size=[x, y, z], center=true);
  }

  if (flatten_bottom) {
    dz_bottom = z / 2 + max_z - flatten_bottom_additional;

    color(c="green")
      translate(v=[dx, dy, dz_bottom])
        cube(size=[x, y, z], center=true);
  }
}

module pegstr() {
  if (flatten_method == "difference") {
    difference() {
      rotate([180, 0, 0]) build();
      flatten();
    }
  } else if (flatten_method == "intersection") {
    intersection() {
      rotate([180, 0, 0]) build();
      flatten();
    }
  } else if (flatten_method == "union") {
    union() {
      rotate([180, 0, 0]) build();
      flatten();
    }
  } else {
    rotate([180, 0, 0]) build();
  }
}

pegstr();

// include <caliper.scad>
// include <drill-bits.scad>
// include <nut-drivers.scad>
// include <multimeter.scad>
// include <voltmeter.scad>
// include <multimeter3.scad>
// include <drivers-wiha-flat.scad>
// include <bins-small-tall.scad>
// include <bins-small-short.scad>
